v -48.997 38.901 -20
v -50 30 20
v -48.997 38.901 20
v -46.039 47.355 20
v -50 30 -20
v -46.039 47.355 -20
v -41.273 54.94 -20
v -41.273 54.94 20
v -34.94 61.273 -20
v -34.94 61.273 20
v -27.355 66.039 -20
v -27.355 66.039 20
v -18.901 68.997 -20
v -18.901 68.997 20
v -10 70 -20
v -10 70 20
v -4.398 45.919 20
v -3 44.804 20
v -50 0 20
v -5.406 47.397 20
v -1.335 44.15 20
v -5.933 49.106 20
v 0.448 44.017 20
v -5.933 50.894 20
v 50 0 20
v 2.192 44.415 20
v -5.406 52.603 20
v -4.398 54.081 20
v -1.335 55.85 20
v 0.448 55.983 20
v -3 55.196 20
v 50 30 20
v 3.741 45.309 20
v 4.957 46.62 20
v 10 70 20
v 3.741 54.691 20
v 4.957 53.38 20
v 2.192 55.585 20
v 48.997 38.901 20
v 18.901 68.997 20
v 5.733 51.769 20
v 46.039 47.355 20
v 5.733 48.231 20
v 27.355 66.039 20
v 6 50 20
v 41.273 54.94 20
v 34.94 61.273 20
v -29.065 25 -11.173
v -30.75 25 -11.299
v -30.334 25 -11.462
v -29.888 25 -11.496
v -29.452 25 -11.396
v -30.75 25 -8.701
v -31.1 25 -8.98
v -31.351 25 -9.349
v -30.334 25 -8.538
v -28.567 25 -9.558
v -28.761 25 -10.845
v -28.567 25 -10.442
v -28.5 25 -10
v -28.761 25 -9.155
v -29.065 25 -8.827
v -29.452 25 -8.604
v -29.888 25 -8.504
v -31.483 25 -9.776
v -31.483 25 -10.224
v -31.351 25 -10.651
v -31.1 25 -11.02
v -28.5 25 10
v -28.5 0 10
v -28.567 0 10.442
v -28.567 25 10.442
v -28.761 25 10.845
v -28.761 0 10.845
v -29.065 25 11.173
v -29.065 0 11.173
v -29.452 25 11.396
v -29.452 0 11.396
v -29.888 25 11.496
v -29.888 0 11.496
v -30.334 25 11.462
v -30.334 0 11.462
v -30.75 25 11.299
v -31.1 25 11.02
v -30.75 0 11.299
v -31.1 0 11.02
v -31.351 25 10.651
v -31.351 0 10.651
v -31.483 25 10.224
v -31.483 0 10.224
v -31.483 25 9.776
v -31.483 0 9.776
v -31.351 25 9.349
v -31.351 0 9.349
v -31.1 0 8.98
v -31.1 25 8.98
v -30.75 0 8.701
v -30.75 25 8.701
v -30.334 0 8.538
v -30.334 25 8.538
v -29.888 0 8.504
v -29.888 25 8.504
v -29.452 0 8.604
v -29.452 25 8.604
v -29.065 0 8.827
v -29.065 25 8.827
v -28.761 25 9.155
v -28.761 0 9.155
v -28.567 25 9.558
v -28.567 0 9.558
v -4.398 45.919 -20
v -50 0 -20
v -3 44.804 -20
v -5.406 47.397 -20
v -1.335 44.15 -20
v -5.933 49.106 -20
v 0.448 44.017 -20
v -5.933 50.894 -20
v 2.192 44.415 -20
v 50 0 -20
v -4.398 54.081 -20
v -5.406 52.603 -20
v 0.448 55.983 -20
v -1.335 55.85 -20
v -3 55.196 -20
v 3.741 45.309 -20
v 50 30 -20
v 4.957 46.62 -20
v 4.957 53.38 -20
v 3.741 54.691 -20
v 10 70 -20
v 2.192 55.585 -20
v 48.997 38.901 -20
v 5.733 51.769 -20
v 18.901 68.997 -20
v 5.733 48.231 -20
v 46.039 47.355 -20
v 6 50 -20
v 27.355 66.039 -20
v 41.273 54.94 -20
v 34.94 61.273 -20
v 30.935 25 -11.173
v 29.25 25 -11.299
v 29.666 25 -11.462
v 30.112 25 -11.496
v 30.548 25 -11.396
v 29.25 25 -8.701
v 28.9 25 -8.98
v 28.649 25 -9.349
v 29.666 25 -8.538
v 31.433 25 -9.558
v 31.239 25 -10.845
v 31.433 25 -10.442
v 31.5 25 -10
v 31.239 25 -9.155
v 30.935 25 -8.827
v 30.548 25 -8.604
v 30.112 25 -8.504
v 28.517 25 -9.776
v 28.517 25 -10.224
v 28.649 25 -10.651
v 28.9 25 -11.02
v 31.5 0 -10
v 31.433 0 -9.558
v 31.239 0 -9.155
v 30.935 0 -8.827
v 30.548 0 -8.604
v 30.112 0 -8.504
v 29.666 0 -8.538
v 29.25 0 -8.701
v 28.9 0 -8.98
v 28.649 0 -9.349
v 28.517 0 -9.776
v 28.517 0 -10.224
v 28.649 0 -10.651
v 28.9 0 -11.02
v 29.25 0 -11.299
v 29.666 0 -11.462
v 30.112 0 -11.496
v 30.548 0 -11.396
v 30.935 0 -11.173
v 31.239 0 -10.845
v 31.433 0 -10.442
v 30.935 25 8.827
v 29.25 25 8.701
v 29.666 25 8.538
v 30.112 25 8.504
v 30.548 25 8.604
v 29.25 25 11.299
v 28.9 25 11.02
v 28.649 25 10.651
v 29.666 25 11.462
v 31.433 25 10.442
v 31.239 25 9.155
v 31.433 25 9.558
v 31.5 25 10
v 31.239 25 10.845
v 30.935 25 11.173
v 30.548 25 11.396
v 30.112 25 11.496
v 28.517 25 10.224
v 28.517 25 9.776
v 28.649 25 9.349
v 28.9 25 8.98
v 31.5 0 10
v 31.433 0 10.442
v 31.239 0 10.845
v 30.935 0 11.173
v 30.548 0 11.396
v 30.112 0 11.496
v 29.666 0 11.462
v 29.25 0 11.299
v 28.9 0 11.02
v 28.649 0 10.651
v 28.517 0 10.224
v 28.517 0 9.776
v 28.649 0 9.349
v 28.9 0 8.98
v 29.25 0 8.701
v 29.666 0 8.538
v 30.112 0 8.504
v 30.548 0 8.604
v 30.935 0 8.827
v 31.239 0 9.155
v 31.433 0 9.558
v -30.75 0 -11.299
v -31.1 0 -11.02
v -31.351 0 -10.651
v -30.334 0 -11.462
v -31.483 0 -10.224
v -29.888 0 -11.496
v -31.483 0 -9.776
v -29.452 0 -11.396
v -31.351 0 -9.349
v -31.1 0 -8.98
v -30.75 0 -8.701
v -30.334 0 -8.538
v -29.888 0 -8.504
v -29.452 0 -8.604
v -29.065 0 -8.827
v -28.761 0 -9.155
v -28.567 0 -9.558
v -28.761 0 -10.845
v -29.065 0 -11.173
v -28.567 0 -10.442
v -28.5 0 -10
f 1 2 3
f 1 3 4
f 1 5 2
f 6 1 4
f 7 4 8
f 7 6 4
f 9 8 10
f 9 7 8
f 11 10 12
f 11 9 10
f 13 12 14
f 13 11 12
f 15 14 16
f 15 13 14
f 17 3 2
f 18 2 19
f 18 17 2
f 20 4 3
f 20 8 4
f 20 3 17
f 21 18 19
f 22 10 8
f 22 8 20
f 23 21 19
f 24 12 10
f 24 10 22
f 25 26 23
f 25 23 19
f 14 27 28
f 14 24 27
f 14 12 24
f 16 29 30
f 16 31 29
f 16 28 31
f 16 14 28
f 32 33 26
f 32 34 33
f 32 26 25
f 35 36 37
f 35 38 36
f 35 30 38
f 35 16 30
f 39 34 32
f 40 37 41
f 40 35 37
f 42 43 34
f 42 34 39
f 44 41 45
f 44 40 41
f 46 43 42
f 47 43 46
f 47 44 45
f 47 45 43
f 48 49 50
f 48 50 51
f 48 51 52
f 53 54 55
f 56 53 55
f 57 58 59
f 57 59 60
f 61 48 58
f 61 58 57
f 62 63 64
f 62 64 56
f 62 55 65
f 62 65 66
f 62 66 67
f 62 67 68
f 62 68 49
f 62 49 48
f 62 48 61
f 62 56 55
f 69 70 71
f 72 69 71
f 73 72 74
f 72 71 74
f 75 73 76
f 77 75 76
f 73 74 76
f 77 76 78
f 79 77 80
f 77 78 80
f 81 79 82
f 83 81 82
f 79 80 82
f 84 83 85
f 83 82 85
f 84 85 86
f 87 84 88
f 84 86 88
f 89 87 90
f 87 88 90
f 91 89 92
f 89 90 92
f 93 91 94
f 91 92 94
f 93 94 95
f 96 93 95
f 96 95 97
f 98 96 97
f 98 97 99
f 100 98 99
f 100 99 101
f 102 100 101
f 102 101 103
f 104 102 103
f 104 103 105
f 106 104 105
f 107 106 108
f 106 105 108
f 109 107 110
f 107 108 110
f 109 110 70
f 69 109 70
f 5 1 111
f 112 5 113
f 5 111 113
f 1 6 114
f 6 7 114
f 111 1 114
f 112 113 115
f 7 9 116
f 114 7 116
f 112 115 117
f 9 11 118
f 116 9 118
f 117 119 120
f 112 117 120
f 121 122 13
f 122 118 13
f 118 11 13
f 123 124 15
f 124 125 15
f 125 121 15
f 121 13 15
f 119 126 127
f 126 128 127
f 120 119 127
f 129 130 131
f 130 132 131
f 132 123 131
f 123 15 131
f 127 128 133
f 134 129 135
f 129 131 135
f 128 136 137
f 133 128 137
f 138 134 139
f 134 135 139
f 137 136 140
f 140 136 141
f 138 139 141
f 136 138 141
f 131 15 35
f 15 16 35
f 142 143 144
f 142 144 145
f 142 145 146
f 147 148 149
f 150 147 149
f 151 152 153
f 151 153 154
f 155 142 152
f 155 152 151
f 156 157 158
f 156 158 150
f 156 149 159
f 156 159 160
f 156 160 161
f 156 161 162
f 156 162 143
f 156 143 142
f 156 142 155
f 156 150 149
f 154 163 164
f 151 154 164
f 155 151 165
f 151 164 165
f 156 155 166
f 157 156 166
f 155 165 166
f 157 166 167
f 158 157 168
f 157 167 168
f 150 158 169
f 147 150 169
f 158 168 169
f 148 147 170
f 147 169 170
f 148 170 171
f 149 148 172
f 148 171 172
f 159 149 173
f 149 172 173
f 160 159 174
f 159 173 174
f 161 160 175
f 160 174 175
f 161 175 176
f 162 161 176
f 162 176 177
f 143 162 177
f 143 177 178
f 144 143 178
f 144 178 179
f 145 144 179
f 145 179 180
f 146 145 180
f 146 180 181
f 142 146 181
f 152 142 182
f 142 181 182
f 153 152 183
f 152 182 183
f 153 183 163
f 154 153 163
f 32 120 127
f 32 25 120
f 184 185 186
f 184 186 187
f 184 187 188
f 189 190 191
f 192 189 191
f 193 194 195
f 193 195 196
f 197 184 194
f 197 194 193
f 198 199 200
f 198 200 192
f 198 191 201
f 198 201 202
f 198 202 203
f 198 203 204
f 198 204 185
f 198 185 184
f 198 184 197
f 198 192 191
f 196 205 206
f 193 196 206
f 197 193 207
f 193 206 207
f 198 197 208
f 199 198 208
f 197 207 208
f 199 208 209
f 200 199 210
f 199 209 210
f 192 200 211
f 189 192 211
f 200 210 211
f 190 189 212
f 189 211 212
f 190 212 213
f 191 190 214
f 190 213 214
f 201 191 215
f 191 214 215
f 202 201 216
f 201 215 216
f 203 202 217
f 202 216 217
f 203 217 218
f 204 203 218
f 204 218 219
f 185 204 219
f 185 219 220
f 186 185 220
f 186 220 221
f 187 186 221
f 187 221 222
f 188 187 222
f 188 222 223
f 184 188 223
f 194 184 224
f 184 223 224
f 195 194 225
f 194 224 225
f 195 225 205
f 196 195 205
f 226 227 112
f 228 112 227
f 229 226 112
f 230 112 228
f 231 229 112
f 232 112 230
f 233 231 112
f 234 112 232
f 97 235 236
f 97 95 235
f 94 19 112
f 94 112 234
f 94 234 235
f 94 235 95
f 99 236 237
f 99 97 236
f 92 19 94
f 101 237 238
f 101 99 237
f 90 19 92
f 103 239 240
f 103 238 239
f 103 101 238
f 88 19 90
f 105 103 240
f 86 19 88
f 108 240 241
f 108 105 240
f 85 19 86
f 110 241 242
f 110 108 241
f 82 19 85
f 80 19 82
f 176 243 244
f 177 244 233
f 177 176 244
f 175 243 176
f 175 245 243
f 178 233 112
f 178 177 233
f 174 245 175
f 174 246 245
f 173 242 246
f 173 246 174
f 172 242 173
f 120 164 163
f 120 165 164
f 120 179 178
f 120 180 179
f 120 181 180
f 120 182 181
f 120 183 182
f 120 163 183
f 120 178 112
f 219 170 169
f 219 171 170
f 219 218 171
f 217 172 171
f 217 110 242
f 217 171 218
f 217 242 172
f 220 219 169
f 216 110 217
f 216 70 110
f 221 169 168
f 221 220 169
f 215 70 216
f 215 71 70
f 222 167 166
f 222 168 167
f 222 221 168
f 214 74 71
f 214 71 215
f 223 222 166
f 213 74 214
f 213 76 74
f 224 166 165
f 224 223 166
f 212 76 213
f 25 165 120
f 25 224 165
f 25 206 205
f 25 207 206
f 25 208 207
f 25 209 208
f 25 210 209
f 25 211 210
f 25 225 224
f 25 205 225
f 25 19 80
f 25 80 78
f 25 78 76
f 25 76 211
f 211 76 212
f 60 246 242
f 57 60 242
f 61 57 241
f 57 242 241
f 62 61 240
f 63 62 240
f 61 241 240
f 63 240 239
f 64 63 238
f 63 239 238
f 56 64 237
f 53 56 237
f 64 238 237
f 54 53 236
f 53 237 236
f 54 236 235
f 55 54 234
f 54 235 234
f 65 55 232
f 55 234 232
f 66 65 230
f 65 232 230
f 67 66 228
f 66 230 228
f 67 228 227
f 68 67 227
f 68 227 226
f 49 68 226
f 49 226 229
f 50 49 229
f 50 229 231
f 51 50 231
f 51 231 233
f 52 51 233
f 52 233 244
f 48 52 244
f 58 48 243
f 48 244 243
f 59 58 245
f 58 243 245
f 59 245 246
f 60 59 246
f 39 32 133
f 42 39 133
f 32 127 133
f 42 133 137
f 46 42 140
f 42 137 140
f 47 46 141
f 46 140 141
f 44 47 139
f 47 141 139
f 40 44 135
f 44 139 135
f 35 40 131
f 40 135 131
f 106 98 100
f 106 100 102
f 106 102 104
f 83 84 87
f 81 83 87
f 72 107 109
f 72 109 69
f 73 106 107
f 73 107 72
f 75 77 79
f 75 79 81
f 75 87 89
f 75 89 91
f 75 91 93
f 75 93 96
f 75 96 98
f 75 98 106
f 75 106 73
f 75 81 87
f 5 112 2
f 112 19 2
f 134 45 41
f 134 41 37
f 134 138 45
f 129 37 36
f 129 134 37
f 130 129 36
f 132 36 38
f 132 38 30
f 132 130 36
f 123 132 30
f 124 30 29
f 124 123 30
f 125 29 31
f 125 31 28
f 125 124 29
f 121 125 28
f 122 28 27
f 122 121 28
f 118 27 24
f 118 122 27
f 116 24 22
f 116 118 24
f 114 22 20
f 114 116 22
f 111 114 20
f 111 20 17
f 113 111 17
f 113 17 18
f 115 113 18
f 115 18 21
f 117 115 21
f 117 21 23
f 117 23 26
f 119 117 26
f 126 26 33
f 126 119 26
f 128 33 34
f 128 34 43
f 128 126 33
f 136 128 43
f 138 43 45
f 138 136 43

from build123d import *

# Parameters (mm, degrees)
F0_W     = 100
F0_H     = 70
F0_R     = 6
F1_DEPTH = 20
F2_R     = 40
F3_R     = 1.5
F4_DEPTH = 25


with BuildPart() as f1:
    # F0 (on Top) → F1 (new body, symmetric)
    with BuildSketch(Plane.XY):
        with Locations((0, 35)):
            Rectangle(F0_W, F0_H)
        with Locations((0, 50)):
            Circle(F0_R, mode=Mode.SUBTRACT)
    extrude(amount=F1_DEPTH, both=True)

    # F2
    f2_edges = [f1.edges().sort_by_distance(p)[0] for p in [
        (-50, 70, 0),
        (50, 70, 0),
    ]]
    fillet(f2_edges, radius=F2_R)

    # F3 (on face) → F4 (cut)
    with BuildSketch(Plane.XZ):
        with Locations((-30, 10)):
            Circle(F3_R)
        with Locations((-30, -10)):
            Circle(F3_R)
        with Locations((30, -10)):
            Circle(F3_R)
        with Locations((30, 10)):
            Circle(F3_R)
    extrude(amount=-F4_DEPTH, mode=Mode.SUBTRACT)


solid = f1.part
